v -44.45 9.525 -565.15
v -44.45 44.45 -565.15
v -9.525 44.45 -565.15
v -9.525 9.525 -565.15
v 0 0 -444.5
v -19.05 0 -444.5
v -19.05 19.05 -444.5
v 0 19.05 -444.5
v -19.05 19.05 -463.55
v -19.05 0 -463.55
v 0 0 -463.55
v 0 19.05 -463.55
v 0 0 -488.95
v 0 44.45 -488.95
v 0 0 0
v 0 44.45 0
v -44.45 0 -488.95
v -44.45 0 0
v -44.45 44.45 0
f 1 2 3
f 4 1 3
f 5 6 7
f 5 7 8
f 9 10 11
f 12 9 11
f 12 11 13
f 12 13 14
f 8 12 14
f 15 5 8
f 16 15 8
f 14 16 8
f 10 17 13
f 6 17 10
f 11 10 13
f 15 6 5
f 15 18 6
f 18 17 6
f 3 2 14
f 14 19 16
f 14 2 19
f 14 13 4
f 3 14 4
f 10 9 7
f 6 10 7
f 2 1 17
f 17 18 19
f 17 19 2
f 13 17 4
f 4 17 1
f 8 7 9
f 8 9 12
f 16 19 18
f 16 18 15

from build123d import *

# Parameters (mm, degrees)
F0_W     = 44.45
F0_H     = 44.45
F1_DEPTH = 565.15
F3_DEPTH = 44.45
F5_DEPTH = 44.451
F6_W     = 19.05
F6_H     = 19.05
F7_DEPTH = 19.05


with BuildPart() as f1:
    # F0 (on Top) → F1 (new body)
    with BuildSketch(Plane.XY):
        with Locations((-22.225, 22.225)):
            Rectangle(F0_W, F0_H)
    extrude(amount=-F1_DEPTH)

    # F2 (on face) → F3 (cut, through all)
    with BuildSketch(Plane.XZ):
        Polygon((-9.525, -565.15), (0, -565.15), (0, -488.95), align=None)
    extrude(amount=-F3_DEPTH, mode=Mode.SUBTRACT)

    # F4 (on face) → F5 (cut, through all)
    with BuildSketch(Plane(origin=(-44.45, 0, 0), x_dir=(0, -1, 0), z_dir=(-1, 0, 0))):
        Polygon((0, -565.15), (0, -488.95), (-9.525, -565.15), align=None)
    extrude(amount=-F5_DEPTH, mode=Mode.SUBTRACT)

    # F6 (on face) → F7 (cut)
    with BuildSketch(Plane.XZ):
        with Locations((-9.525, -454.025)):
            Rectangle(F6_W, F6_H)
    extrude(amount=-F7_DEPTH, mode=Mode.SUBTRACT)


solid = f1.part
